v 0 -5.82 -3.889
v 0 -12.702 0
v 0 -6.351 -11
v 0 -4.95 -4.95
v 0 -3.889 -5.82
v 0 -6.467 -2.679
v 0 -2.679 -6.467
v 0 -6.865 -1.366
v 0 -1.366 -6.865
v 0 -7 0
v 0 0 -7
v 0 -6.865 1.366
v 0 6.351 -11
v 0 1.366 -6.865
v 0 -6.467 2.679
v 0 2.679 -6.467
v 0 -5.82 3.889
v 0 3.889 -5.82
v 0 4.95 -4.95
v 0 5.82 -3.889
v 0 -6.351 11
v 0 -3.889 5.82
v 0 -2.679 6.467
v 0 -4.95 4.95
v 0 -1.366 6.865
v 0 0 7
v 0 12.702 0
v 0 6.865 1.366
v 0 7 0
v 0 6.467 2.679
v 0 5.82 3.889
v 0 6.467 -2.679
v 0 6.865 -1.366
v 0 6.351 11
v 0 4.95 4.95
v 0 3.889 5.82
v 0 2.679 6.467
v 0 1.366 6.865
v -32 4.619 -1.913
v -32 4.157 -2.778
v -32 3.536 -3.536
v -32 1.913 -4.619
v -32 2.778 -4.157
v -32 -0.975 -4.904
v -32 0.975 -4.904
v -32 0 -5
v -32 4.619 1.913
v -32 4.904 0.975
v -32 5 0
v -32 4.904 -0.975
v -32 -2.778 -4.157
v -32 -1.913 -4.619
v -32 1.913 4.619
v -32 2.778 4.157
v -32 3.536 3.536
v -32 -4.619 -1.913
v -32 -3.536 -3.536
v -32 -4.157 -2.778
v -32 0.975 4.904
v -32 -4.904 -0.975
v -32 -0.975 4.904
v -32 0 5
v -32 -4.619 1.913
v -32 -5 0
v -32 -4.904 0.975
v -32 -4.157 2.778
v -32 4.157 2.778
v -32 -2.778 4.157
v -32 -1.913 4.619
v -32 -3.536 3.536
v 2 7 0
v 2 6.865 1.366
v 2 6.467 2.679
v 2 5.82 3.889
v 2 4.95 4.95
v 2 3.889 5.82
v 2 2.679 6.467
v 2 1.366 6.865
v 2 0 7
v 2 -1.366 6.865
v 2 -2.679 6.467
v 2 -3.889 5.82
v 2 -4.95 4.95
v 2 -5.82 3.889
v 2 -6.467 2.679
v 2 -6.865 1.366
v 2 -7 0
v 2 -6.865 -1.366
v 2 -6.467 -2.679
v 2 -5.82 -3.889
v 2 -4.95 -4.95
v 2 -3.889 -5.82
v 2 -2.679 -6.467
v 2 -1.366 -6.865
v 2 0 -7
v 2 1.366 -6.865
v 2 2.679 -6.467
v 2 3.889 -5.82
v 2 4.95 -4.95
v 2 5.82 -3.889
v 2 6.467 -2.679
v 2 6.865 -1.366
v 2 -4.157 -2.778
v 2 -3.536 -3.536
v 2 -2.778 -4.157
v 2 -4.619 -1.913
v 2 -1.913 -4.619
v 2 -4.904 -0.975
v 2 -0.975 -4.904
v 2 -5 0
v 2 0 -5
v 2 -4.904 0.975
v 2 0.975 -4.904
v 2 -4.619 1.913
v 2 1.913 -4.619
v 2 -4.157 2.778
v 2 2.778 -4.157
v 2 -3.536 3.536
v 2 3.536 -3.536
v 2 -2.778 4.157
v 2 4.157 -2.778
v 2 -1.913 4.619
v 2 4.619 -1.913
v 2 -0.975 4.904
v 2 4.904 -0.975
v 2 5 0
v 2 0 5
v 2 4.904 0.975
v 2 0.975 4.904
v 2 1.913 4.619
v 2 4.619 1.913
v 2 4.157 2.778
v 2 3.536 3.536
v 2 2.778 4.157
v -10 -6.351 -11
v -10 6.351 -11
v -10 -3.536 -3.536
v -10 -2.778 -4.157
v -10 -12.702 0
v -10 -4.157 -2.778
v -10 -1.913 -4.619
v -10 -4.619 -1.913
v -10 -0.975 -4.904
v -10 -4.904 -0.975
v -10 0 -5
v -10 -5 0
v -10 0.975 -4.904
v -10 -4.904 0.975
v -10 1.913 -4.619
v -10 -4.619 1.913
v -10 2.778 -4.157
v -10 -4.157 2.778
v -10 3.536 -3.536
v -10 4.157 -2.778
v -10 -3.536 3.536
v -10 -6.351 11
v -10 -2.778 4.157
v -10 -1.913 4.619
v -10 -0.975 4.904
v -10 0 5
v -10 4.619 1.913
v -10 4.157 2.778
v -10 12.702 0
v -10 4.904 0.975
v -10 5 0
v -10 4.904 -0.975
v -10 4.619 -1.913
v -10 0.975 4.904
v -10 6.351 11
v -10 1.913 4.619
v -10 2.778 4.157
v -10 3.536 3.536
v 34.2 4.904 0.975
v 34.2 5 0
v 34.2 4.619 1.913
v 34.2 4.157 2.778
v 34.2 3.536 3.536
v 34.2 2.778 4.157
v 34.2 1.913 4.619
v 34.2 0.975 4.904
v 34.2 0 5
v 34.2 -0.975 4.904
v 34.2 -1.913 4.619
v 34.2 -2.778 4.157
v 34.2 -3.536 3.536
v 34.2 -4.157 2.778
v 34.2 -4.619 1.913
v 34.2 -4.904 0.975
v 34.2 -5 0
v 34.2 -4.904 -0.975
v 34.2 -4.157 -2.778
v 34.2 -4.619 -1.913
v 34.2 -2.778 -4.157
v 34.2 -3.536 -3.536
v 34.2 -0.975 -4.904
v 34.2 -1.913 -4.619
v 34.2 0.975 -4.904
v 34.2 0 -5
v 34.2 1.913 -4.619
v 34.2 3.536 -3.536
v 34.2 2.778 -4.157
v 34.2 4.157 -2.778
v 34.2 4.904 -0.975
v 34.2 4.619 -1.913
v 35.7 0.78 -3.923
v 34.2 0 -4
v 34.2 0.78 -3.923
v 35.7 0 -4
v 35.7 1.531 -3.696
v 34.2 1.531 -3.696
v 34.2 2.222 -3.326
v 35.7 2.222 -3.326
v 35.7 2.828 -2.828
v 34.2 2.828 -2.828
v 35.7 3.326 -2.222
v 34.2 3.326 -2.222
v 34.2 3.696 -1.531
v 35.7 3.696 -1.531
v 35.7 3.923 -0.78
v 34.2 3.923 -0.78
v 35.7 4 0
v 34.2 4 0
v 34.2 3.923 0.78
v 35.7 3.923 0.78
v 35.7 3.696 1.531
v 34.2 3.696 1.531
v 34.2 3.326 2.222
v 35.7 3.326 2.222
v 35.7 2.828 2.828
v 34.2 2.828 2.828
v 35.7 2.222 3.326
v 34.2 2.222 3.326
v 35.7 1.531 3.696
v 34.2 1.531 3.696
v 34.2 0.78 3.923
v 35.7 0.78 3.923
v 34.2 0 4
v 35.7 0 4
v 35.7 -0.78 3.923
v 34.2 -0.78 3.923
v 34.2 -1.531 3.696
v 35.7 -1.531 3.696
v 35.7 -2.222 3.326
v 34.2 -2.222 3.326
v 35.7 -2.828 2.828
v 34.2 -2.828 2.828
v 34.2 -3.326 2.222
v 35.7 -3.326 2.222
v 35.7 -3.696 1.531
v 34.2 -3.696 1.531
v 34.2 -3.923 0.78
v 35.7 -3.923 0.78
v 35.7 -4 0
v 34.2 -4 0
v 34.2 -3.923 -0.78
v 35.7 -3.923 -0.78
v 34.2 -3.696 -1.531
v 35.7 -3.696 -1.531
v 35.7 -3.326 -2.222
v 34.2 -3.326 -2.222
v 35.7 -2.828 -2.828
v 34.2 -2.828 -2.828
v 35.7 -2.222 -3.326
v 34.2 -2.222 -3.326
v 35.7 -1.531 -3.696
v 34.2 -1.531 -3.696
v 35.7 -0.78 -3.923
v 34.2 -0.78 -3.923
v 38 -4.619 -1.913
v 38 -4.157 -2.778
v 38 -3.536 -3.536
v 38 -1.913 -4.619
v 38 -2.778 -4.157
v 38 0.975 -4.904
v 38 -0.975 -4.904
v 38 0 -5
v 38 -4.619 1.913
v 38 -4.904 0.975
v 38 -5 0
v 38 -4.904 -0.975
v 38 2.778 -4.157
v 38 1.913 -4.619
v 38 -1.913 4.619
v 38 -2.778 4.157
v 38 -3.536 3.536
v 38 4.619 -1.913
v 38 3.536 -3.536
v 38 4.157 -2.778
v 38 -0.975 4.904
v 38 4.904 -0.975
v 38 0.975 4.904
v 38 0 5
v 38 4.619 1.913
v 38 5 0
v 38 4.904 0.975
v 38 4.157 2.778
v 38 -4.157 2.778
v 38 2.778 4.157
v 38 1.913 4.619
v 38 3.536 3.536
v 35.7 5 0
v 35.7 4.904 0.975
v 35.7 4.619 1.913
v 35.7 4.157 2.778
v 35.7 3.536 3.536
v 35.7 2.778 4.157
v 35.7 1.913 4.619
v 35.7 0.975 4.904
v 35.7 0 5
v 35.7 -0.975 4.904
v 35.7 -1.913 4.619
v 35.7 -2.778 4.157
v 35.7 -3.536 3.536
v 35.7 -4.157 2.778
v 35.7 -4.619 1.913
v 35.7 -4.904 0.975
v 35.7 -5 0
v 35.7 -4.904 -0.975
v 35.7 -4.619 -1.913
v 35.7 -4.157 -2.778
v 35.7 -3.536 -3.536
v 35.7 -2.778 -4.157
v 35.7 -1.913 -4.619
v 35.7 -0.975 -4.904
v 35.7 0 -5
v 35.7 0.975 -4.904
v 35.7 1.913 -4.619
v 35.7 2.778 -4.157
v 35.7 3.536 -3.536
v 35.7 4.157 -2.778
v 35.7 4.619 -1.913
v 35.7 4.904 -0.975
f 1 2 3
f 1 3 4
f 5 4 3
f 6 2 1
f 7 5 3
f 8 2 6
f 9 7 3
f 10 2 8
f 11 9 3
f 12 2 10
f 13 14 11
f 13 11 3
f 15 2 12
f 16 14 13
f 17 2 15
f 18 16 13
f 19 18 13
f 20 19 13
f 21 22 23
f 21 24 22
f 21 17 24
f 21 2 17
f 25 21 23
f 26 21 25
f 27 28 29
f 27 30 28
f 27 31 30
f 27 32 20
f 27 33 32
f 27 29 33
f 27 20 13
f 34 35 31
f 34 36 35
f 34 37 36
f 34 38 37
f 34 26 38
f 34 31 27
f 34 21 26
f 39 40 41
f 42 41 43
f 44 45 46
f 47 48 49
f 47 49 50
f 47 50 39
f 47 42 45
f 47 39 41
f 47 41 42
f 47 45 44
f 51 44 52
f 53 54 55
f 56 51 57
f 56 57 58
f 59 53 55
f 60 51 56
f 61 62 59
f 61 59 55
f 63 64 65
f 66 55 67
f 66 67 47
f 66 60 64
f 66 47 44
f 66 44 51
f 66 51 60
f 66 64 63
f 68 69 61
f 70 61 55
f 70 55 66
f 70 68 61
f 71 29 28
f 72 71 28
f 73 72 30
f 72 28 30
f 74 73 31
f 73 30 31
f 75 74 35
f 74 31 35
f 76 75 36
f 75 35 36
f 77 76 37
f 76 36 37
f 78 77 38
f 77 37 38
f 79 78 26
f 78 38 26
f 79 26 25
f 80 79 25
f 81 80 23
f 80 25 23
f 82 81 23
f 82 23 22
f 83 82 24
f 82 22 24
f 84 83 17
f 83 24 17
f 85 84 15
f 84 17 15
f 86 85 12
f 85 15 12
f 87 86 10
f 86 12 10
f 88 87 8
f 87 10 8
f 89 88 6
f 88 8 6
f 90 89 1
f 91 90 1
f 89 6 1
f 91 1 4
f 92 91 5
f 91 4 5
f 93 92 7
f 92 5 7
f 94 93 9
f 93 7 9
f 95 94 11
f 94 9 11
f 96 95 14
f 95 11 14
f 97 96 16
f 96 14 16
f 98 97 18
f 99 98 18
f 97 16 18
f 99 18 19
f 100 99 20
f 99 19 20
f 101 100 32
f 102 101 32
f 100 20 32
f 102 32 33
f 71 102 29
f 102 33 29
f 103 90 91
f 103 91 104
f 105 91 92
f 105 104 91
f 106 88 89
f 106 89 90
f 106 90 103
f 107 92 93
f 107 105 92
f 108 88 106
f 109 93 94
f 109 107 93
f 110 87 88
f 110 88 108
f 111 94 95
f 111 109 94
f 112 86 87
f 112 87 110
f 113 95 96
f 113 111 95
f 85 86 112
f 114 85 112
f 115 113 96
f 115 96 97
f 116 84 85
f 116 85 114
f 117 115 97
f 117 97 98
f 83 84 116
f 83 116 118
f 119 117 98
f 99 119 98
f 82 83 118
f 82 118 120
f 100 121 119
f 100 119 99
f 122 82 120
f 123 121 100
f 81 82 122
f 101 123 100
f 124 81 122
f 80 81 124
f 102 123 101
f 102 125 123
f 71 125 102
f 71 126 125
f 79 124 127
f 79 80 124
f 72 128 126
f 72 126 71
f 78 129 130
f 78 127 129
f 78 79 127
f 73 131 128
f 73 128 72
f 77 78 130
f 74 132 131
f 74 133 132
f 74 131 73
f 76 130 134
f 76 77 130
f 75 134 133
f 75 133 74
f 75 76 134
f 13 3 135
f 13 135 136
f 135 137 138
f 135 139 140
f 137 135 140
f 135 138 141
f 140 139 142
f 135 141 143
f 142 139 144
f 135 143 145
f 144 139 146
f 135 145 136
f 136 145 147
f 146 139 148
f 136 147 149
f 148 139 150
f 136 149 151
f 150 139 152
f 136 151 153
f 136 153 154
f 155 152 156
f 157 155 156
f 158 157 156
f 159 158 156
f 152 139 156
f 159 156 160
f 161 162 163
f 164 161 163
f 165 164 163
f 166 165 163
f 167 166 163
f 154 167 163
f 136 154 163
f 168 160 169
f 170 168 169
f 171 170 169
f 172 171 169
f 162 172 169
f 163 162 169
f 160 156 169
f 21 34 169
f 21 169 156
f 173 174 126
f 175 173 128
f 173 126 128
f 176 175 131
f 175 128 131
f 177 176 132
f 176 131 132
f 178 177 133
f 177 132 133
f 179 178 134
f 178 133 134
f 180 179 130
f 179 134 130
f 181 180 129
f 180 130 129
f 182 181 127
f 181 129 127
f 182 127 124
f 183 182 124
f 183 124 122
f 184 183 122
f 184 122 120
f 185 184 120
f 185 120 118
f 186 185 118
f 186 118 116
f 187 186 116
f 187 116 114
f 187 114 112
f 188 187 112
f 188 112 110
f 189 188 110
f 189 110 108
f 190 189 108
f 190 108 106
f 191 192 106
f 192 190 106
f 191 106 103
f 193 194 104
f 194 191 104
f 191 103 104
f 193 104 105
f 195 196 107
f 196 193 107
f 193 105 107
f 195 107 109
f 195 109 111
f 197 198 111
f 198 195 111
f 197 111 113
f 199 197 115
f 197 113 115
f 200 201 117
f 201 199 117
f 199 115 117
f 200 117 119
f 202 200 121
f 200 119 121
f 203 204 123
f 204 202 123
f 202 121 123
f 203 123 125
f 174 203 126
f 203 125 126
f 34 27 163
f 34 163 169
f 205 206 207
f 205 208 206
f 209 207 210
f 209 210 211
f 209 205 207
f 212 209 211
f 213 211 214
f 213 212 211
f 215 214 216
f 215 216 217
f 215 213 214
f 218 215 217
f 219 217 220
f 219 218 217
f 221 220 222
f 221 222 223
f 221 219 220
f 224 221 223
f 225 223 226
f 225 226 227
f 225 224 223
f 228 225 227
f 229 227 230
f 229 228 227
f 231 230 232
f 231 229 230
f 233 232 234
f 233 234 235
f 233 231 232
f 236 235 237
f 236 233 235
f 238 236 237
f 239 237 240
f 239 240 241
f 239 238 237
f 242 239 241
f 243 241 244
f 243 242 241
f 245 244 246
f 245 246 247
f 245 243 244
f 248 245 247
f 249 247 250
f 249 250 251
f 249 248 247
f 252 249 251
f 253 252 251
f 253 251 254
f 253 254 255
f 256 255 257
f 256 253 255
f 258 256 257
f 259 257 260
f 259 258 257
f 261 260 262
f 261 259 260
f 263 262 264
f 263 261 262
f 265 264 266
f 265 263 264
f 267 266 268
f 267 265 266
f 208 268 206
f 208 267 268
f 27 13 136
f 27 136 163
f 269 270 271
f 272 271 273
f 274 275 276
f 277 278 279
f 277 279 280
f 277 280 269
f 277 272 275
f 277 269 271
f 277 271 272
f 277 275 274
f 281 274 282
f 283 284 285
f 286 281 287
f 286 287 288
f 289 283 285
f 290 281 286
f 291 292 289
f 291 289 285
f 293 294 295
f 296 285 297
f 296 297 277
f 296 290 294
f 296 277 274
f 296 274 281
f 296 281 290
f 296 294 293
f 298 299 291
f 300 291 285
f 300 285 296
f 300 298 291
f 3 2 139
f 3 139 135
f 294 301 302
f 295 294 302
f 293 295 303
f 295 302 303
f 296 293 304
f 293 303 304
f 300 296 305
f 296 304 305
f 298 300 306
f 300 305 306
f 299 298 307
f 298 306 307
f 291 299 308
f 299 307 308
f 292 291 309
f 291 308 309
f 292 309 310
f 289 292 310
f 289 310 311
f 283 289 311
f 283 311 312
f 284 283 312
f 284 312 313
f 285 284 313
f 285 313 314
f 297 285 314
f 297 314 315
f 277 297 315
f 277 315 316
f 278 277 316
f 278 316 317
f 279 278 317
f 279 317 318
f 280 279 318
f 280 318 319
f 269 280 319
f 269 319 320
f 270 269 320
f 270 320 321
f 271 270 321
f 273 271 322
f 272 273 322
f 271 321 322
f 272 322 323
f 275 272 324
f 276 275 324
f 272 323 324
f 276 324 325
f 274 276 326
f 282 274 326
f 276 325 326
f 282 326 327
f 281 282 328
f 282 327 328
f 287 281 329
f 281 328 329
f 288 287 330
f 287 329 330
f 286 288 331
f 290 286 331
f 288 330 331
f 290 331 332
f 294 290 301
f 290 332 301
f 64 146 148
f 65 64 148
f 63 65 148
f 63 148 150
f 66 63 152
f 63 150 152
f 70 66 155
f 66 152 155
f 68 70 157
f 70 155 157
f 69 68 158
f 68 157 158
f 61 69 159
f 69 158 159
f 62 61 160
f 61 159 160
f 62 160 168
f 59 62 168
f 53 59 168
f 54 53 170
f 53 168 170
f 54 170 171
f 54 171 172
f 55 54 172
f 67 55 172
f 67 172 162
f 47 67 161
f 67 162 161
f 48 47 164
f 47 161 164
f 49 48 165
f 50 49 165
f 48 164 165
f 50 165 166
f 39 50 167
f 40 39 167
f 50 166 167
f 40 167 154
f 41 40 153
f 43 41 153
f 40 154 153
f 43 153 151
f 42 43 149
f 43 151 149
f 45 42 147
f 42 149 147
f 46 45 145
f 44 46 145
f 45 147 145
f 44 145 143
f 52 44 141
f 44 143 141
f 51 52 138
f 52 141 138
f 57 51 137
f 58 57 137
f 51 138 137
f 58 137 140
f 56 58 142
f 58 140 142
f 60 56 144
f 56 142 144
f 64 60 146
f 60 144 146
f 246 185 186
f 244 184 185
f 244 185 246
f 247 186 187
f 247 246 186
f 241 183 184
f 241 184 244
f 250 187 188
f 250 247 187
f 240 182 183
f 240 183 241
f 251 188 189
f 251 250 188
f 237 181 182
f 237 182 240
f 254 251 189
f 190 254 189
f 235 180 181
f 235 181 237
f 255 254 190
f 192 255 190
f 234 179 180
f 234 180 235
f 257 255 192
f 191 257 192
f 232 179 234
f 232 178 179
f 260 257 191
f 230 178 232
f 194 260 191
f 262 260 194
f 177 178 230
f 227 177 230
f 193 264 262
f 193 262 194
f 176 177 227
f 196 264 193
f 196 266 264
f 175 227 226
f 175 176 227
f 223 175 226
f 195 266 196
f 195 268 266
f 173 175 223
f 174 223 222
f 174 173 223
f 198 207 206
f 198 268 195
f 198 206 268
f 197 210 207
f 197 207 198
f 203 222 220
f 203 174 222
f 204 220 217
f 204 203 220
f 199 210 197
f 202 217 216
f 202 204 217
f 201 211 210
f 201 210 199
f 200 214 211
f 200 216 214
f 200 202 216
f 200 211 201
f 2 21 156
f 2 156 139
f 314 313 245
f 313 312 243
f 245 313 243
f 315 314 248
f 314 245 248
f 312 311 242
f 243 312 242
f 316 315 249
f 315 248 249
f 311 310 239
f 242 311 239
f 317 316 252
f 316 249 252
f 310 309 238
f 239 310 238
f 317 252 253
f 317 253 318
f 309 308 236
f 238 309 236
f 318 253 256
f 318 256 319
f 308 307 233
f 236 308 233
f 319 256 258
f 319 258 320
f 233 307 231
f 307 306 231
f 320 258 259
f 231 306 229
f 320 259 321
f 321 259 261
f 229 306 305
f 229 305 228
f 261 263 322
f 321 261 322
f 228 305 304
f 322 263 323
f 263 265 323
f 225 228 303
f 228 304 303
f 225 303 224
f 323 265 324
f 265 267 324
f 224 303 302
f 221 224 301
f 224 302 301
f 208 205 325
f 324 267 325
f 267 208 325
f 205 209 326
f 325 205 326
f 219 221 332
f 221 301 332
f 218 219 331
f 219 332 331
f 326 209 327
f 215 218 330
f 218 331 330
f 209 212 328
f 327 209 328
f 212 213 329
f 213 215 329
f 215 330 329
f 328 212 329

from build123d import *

# Parameters (mm, degrees)
F1_DEPTH = 10
F2_R     = 7
F3_DEPTH = 2
F4_R     = 5
F5_DEPTH = 36
F6_W     = 1.5
F6_H     = 1.416463
F8_R     = 5
F9_DEPTH = 22


with BuildPart() as f1:
    # F0 (on Right) → F1 (new body)
    with BuildSketch(Plane.YZ):
        Polygon((-6.350853, -11), (6.350853, -11), (12.701706, 0), (6.350853, 11), (-6.350853, 11), (-12.701706, 0), align=None)
    extrude(amount=-F1_DEPTH)

    # F2 (on face) → F3 (join)
    with BuildSketch(Plane.YZ):
        Circle(F2_R)
    extrude(amount=F3_DEPTH)

    # F4 (on face) → F5 (join)
    with BuildSketch(Plane.YZ.offset(2)):
        Circle(F4_R)
    extrude(amount=F5_DEPTH)

    # F6 (on Front) → F7 (revolve, cut)
    with BuildSketch(Plane.XZ):
        with Locations((34.95, -4.708232)):
            Rectangle(F6_W, F6_H)
    revolve(axis=Axis((38, 0, 0), (1, 0, 0)), mode=Mode.SUBTRACT)

    # F8 (on face) → F9 (join)
    with BuildSketch(Plane(origin=(-10, 0, 0), x_dir=(0, -1, 0), z_dir=(-1, 0, 0))):
        Circle(F8_R)
    extrude(amount=F9_DEPTH)


solid = f1.part
